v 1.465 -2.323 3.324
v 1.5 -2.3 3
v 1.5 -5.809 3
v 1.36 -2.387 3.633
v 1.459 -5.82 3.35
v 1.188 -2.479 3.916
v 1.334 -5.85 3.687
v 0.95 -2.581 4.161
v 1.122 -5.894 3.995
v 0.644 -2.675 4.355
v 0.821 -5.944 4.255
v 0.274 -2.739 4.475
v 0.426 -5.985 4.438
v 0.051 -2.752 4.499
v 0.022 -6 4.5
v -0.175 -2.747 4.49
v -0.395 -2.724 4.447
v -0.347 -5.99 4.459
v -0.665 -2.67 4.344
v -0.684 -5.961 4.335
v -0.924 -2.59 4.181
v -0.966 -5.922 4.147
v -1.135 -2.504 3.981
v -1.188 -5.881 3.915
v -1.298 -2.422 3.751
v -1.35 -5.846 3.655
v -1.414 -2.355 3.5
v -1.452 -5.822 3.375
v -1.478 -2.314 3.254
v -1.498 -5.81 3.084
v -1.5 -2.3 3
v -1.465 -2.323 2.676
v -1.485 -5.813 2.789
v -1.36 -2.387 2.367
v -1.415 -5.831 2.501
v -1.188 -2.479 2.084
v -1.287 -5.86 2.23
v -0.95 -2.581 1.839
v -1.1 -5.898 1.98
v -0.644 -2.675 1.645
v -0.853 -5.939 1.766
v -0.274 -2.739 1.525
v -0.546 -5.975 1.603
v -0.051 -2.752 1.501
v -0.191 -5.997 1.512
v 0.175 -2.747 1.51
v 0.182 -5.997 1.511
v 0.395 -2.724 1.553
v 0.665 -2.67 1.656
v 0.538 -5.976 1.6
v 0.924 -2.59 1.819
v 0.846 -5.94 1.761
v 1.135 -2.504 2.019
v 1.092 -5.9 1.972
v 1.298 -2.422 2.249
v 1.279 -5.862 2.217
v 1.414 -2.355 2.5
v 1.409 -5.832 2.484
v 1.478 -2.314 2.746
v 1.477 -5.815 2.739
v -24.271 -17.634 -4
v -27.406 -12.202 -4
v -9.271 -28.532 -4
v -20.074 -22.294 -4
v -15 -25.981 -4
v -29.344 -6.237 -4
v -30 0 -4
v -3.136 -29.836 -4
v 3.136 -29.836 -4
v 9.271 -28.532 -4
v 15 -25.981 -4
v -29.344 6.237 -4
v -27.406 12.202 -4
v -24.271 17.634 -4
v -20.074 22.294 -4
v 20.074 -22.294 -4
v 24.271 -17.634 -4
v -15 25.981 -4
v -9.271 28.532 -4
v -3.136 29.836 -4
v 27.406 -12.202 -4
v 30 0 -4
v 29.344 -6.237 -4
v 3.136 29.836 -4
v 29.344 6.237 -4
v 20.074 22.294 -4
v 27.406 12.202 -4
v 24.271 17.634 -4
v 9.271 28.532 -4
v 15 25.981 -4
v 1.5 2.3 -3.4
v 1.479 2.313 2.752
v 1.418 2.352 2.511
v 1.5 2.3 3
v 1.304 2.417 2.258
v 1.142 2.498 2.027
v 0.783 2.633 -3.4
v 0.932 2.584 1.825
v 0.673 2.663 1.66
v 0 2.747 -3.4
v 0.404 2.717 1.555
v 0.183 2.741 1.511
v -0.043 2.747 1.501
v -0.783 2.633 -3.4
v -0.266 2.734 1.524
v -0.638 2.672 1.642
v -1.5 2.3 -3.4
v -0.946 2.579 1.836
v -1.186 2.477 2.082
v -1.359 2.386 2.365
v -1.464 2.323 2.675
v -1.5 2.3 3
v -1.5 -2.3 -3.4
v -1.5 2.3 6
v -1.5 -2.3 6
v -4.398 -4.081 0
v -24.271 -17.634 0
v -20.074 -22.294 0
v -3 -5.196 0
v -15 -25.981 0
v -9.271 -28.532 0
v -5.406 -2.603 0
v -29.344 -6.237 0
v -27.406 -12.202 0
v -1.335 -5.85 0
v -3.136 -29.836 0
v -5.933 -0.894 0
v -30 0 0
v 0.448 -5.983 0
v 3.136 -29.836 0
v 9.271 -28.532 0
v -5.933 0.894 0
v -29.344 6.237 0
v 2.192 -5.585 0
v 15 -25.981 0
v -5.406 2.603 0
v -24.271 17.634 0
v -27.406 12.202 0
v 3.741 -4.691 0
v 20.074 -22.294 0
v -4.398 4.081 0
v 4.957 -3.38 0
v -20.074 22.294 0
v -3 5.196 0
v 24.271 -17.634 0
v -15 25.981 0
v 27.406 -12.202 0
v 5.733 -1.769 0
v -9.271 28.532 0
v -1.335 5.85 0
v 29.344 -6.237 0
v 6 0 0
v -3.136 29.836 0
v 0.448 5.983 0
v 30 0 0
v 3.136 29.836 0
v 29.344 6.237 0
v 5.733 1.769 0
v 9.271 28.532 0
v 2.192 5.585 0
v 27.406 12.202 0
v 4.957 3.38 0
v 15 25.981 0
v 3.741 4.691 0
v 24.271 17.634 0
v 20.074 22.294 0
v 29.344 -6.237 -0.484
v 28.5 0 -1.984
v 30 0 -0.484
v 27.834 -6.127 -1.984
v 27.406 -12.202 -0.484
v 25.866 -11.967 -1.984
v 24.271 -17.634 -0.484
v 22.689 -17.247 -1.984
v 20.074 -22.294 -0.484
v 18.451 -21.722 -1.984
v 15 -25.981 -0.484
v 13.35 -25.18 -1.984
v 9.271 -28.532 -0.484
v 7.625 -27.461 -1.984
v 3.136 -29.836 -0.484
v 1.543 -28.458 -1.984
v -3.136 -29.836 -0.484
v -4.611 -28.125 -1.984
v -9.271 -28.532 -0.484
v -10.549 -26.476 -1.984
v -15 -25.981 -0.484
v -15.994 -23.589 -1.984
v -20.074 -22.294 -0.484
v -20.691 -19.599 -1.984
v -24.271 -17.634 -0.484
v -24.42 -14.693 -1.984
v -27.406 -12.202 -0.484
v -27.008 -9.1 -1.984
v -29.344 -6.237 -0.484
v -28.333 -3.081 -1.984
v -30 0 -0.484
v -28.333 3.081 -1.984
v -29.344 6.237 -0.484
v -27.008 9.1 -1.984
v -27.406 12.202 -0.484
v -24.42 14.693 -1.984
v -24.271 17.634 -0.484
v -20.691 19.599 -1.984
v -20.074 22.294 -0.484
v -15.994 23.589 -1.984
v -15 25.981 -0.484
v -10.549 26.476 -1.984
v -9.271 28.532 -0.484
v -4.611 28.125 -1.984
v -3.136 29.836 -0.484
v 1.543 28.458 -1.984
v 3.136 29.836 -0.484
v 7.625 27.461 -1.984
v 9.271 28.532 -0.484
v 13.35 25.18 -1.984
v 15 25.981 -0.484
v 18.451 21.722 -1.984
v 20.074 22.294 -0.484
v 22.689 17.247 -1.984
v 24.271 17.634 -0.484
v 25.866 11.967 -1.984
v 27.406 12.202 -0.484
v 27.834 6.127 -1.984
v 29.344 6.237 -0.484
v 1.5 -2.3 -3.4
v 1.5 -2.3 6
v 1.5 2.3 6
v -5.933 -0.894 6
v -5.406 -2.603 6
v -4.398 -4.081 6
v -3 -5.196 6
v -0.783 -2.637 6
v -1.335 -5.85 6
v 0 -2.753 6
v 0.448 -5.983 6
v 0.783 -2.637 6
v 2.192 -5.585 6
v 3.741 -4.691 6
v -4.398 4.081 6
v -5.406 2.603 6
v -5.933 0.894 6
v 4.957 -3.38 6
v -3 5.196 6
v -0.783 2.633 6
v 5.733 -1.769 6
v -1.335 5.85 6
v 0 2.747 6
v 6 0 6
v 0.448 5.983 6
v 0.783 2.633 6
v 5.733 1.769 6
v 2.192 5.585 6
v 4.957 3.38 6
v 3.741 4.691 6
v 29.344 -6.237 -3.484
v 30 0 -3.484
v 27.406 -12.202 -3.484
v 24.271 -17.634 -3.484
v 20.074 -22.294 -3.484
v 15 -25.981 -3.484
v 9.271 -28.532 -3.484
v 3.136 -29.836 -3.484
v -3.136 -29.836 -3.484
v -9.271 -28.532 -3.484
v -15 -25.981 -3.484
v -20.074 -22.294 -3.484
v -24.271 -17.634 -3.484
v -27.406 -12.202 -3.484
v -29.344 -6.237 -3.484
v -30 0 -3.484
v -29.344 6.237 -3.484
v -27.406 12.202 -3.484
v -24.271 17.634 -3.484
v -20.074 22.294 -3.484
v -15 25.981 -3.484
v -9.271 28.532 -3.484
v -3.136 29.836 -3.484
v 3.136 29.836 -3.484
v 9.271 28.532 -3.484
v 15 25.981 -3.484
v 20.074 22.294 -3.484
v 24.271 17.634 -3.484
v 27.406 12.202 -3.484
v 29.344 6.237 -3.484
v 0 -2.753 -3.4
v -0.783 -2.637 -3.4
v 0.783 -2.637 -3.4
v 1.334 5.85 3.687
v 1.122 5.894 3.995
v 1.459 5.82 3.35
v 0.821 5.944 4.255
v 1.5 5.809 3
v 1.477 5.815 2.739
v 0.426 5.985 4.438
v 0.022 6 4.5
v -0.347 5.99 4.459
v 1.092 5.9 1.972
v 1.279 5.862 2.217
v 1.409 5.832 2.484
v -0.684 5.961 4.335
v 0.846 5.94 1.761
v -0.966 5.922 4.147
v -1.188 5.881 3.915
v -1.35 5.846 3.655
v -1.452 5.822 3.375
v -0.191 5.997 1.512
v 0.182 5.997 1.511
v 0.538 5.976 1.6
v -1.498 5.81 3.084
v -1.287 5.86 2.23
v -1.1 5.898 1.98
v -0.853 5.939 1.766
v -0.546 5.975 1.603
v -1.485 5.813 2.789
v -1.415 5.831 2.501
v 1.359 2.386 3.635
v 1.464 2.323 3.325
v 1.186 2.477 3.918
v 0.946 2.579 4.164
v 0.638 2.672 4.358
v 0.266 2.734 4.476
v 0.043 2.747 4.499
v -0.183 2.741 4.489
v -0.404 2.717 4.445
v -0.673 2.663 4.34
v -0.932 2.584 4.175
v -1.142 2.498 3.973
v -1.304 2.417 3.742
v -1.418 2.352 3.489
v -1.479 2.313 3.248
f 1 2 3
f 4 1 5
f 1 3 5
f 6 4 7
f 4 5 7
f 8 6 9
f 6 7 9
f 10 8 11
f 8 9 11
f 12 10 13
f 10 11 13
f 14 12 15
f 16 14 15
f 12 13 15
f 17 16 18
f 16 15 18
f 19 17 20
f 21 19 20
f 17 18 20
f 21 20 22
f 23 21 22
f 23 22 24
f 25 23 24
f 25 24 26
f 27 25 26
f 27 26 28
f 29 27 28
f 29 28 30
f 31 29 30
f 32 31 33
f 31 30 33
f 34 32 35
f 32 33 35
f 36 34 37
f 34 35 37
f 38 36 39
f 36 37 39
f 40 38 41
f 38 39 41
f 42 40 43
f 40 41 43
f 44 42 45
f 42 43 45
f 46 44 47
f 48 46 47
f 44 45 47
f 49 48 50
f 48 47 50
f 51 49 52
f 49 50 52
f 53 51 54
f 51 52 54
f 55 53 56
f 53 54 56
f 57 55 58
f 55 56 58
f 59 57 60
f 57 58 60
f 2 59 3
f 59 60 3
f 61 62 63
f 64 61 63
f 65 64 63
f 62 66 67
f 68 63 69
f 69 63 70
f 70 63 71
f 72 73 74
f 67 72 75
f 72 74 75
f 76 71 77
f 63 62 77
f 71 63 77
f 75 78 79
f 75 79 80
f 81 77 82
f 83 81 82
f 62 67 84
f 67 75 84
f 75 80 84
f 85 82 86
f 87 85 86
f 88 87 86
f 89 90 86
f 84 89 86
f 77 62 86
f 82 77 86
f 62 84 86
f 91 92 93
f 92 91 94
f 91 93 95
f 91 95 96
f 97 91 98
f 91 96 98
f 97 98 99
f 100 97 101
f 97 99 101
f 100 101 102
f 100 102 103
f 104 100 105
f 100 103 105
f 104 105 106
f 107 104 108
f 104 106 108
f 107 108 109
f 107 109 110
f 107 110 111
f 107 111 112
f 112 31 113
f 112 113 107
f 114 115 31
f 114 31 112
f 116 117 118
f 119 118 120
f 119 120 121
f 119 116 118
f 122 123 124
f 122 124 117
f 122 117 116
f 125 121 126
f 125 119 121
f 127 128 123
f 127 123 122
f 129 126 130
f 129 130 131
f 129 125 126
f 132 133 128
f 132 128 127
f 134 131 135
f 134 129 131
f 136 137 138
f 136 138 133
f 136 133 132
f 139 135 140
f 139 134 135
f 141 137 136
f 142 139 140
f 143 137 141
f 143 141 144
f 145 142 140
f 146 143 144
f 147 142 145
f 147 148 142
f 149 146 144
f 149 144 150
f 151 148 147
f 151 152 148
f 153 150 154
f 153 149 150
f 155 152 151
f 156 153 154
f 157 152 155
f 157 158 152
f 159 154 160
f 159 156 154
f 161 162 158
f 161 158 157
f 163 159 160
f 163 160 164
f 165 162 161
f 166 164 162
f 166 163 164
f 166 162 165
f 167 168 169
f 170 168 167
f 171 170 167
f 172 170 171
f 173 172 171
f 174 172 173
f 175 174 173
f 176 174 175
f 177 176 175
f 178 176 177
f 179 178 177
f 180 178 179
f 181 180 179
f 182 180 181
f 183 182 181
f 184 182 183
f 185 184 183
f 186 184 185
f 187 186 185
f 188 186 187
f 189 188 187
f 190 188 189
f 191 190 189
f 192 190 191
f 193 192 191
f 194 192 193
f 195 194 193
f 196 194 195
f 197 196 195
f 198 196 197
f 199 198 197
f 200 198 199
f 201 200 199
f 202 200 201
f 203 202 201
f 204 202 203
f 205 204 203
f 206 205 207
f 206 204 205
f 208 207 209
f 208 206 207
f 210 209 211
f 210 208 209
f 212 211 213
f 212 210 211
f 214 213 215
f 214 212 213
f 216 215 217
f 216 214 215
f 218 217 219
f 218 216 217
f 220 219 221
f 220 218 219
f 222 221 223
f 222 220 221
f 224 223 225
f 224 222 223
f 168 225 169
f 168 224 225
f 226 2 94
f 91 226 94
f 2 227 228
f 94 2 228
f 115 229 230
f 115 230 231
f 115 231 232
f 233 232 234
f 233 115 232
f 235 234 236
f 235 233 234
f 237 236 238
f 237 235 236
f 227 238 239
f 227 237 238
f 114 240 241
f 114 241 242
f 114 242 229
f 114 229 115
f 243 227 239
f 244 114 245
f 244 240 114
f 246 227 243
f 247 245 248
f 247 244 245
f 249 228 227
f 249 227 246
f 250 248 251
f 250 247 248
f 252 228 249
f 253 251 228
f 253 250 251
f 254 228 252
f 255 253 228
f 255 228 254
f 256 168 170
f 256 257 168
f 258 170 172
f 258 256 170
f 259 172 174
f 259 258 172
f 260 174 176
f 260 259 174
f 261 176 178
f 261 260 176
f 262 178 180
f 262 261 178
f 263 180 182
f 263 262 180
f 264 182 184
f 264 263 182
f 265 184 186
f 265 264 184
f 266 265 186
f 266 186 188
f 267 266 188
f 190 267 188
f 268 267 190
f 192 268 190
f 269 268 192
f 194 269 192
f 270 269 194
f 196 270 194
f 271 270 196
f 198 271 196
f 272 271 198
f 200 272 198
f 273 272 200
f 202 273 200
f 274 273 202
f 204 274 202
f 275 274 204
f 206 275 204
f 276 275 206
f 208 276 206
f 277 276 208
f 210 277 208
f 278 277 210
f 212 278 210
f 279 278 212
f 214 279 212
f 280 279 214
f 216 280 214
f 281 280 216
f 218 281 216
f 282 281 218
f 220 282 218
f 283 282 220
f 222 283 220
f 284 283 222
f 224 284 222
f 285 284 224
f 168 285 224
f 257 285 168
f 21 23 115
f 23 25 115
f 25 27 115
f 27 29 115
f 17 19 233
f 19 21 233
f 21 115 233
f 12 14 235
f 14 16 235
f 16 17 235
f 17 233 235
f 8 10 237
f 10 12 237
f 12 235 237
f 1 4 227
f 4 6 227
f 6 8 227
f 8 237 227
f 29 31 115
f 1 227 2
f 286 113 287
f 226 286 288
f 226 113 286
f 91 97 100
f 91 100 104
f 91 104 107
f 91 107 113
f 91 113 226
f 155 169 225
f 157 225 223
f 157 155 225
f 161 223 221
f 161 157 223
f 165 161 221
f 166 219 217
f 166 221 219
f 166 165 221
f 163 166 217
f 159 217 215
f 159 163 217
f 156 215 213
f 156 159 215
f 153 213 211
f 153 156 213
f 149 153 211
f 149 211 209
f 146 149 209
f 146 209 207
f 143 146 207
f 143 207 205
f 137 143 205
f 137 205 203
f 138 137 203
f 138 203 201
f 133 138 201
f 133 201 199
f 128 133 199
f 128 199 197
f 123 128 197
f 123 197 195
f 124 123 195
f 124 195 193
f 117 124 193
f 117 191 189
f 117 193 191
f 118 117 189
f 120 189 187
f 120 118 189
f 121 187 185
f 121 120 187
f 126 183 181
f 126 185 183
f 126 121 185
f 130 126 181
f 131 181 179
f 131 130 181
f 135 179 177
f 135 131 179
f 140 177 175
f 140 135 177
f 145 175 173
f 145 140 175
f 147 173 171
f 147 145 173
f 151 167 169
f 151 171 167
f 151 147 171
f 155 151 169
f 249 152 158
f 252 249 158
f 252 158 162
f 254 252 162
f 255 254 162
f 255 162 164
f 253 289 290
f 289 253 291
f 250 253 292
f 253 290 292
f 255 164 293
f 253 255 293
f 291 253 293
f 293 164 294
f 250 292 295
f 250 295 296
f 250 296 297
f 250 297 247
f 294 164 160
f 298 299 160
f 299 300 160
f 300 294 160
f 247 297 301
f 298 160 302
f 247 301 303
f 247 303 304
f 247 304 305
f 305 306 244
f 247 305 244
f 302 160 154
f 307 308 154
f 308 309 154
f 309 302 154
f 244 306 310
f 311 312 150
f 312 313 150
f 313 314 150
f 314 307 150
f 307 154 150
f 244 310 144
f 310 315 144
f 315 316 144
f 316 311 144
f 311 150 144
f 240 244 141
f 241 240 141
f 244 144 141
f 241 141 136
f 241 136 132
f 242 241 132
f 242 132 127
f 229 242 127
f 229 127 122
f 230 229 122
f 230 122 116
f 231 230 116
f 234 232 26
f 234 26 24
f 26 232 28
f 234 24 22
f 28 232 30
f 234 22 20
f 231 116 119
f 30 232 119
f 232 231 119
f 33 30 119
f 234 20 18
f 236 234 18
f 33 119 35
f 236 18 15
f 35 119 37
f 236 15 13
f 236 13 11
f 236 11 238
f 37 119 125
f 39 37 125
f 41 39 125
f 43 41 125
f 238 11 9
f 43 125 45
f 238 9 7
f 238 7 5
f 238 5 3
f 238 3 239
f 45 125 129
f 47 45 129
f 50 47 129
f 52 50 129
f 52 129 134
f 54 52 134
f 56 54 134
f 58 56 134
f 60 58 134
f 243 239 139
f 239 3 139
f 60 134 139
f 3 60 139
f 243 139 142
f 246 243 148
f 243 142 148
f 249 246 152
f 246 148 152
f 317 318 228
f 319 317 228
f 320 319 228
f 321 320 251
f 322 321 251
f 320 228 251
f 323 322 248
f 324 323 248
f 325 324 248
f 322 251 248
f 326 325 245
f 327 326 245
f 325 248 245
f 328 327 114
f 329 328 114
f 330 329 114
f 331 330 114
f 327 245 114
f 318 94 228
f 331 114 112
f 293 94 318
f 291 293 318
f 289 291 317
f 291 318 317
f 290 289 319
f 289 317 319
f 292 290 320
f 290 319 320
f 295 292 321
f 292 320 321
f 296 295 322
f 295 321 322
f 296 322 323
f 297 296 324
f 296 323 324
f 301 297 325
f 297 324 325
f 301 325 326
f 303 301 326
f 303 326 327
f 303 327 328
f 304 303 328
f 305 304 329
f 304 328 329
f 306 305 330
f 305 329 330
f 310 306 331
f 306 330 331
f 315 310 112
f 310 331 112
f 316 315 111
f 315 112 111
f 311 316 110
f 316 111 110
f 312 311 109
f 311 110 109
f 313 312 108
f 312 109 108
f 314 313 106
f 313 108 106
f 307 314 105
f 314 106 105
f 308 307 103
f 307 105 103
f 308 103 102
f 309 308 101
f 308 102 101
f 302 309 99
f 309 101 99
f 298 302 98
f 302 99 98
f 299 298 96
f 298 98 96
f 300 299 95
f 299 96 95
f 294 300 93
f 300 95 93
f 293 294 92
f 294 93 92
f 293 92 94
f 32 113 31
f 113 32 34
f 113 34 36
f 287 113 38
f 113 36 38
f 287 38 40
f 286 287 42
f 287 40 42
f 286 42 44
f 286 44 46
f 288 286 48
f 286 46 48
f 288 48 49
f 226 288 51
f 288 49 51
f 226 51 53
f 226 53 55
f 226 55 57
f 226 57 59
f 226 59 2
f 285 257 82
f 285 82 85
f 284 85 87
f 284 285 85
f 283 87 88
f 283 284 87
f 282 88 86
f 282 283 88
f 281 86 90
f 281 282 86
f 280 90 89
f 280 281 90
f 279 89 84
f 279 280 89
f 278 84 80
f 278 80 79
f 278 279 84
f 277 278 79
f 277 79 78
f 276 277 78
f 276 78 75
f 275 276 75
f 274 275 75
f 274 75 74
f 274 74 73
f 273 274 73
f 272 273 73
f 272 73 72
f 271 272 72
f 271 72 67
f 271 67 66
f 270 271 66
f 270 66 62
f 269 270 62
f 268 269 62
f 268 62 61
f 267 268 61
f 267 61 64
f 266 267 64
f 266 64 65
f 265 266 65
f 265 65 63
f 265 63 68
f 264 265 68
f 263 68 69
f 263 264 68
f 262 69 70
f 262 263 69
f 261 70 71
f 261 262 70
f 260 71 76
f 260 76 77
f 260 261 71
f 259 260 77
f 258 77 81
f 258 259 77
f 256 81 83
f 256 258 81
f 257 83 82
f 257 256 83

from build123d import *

# Parameters (mm, degrees)
F0_R     = 30
F0_R_2   = 6
F1_DEPTH = 4
F2_DEPTH = 6
F3_R     = 1.5
F4_DEPTH = 12.5
F5_W     = 3
F5_H     = 4.6
F6_DEPTH = 9.4


with BuildPart() as f1:
    # F0 (on Top) → F1 (new body)
    with BuildSketch(Plane.XY):
        Circle(F0_R)
        Circle(F0_R_2, mode=Mode.SUBTRACT)
        Circle(F0_R_2)
    extrude(amount=-F1_DEPTH)

    # F0 (on Top) → F2 (join)
    with BuildSketch(Plane.XY):
        Circle(F0_R_2)
    extrude(amount=F2_DEPTH)

    # F3 (on Front) → F4 (cut, symmetric)
    with BuildSketch(Plane.XZ):
        with Locations((0, 3)):
            Circle(F3_R)
    extrude(amount=F4_DEPTH, both=True, mode=Mode.SUBTRACT)

    # F5 (on face) → F6 (cut)
    with BuildSketch(Plane.XY.offset(6)):
        with BuildLine():
            ThreePointArc((1.5, 2.3), (0, 2.747197), (-1.5, 2.3))
            Line((-1.5, 2.3), (1.5, 2.3))
        make_face()
        Rectangle(F5_W, F5_H)
        with BuildLine():
            Line((1.5, -2.3), (-1.5, -2.3))
            ThreePointArc((-1.5, -2.3), (0, -2.752803), (1.5, -2.3))
        make_face()
    extrude(amount=-F6_DEPTH, mode=Mode.SUBTRACT)

    # F7 (on Front) → F8 (revolve, cut)
    with BuildSketch(Plane.XZ):
        Polygon((30, -3.483821), (30, -0.483821), (28.5, -1.983821), align=None)
    revolve(axis=Axis((0, 0, -0.420868), (0, 0, -1)), mode=Mode.SUBTRACT)


solid = f1.part
